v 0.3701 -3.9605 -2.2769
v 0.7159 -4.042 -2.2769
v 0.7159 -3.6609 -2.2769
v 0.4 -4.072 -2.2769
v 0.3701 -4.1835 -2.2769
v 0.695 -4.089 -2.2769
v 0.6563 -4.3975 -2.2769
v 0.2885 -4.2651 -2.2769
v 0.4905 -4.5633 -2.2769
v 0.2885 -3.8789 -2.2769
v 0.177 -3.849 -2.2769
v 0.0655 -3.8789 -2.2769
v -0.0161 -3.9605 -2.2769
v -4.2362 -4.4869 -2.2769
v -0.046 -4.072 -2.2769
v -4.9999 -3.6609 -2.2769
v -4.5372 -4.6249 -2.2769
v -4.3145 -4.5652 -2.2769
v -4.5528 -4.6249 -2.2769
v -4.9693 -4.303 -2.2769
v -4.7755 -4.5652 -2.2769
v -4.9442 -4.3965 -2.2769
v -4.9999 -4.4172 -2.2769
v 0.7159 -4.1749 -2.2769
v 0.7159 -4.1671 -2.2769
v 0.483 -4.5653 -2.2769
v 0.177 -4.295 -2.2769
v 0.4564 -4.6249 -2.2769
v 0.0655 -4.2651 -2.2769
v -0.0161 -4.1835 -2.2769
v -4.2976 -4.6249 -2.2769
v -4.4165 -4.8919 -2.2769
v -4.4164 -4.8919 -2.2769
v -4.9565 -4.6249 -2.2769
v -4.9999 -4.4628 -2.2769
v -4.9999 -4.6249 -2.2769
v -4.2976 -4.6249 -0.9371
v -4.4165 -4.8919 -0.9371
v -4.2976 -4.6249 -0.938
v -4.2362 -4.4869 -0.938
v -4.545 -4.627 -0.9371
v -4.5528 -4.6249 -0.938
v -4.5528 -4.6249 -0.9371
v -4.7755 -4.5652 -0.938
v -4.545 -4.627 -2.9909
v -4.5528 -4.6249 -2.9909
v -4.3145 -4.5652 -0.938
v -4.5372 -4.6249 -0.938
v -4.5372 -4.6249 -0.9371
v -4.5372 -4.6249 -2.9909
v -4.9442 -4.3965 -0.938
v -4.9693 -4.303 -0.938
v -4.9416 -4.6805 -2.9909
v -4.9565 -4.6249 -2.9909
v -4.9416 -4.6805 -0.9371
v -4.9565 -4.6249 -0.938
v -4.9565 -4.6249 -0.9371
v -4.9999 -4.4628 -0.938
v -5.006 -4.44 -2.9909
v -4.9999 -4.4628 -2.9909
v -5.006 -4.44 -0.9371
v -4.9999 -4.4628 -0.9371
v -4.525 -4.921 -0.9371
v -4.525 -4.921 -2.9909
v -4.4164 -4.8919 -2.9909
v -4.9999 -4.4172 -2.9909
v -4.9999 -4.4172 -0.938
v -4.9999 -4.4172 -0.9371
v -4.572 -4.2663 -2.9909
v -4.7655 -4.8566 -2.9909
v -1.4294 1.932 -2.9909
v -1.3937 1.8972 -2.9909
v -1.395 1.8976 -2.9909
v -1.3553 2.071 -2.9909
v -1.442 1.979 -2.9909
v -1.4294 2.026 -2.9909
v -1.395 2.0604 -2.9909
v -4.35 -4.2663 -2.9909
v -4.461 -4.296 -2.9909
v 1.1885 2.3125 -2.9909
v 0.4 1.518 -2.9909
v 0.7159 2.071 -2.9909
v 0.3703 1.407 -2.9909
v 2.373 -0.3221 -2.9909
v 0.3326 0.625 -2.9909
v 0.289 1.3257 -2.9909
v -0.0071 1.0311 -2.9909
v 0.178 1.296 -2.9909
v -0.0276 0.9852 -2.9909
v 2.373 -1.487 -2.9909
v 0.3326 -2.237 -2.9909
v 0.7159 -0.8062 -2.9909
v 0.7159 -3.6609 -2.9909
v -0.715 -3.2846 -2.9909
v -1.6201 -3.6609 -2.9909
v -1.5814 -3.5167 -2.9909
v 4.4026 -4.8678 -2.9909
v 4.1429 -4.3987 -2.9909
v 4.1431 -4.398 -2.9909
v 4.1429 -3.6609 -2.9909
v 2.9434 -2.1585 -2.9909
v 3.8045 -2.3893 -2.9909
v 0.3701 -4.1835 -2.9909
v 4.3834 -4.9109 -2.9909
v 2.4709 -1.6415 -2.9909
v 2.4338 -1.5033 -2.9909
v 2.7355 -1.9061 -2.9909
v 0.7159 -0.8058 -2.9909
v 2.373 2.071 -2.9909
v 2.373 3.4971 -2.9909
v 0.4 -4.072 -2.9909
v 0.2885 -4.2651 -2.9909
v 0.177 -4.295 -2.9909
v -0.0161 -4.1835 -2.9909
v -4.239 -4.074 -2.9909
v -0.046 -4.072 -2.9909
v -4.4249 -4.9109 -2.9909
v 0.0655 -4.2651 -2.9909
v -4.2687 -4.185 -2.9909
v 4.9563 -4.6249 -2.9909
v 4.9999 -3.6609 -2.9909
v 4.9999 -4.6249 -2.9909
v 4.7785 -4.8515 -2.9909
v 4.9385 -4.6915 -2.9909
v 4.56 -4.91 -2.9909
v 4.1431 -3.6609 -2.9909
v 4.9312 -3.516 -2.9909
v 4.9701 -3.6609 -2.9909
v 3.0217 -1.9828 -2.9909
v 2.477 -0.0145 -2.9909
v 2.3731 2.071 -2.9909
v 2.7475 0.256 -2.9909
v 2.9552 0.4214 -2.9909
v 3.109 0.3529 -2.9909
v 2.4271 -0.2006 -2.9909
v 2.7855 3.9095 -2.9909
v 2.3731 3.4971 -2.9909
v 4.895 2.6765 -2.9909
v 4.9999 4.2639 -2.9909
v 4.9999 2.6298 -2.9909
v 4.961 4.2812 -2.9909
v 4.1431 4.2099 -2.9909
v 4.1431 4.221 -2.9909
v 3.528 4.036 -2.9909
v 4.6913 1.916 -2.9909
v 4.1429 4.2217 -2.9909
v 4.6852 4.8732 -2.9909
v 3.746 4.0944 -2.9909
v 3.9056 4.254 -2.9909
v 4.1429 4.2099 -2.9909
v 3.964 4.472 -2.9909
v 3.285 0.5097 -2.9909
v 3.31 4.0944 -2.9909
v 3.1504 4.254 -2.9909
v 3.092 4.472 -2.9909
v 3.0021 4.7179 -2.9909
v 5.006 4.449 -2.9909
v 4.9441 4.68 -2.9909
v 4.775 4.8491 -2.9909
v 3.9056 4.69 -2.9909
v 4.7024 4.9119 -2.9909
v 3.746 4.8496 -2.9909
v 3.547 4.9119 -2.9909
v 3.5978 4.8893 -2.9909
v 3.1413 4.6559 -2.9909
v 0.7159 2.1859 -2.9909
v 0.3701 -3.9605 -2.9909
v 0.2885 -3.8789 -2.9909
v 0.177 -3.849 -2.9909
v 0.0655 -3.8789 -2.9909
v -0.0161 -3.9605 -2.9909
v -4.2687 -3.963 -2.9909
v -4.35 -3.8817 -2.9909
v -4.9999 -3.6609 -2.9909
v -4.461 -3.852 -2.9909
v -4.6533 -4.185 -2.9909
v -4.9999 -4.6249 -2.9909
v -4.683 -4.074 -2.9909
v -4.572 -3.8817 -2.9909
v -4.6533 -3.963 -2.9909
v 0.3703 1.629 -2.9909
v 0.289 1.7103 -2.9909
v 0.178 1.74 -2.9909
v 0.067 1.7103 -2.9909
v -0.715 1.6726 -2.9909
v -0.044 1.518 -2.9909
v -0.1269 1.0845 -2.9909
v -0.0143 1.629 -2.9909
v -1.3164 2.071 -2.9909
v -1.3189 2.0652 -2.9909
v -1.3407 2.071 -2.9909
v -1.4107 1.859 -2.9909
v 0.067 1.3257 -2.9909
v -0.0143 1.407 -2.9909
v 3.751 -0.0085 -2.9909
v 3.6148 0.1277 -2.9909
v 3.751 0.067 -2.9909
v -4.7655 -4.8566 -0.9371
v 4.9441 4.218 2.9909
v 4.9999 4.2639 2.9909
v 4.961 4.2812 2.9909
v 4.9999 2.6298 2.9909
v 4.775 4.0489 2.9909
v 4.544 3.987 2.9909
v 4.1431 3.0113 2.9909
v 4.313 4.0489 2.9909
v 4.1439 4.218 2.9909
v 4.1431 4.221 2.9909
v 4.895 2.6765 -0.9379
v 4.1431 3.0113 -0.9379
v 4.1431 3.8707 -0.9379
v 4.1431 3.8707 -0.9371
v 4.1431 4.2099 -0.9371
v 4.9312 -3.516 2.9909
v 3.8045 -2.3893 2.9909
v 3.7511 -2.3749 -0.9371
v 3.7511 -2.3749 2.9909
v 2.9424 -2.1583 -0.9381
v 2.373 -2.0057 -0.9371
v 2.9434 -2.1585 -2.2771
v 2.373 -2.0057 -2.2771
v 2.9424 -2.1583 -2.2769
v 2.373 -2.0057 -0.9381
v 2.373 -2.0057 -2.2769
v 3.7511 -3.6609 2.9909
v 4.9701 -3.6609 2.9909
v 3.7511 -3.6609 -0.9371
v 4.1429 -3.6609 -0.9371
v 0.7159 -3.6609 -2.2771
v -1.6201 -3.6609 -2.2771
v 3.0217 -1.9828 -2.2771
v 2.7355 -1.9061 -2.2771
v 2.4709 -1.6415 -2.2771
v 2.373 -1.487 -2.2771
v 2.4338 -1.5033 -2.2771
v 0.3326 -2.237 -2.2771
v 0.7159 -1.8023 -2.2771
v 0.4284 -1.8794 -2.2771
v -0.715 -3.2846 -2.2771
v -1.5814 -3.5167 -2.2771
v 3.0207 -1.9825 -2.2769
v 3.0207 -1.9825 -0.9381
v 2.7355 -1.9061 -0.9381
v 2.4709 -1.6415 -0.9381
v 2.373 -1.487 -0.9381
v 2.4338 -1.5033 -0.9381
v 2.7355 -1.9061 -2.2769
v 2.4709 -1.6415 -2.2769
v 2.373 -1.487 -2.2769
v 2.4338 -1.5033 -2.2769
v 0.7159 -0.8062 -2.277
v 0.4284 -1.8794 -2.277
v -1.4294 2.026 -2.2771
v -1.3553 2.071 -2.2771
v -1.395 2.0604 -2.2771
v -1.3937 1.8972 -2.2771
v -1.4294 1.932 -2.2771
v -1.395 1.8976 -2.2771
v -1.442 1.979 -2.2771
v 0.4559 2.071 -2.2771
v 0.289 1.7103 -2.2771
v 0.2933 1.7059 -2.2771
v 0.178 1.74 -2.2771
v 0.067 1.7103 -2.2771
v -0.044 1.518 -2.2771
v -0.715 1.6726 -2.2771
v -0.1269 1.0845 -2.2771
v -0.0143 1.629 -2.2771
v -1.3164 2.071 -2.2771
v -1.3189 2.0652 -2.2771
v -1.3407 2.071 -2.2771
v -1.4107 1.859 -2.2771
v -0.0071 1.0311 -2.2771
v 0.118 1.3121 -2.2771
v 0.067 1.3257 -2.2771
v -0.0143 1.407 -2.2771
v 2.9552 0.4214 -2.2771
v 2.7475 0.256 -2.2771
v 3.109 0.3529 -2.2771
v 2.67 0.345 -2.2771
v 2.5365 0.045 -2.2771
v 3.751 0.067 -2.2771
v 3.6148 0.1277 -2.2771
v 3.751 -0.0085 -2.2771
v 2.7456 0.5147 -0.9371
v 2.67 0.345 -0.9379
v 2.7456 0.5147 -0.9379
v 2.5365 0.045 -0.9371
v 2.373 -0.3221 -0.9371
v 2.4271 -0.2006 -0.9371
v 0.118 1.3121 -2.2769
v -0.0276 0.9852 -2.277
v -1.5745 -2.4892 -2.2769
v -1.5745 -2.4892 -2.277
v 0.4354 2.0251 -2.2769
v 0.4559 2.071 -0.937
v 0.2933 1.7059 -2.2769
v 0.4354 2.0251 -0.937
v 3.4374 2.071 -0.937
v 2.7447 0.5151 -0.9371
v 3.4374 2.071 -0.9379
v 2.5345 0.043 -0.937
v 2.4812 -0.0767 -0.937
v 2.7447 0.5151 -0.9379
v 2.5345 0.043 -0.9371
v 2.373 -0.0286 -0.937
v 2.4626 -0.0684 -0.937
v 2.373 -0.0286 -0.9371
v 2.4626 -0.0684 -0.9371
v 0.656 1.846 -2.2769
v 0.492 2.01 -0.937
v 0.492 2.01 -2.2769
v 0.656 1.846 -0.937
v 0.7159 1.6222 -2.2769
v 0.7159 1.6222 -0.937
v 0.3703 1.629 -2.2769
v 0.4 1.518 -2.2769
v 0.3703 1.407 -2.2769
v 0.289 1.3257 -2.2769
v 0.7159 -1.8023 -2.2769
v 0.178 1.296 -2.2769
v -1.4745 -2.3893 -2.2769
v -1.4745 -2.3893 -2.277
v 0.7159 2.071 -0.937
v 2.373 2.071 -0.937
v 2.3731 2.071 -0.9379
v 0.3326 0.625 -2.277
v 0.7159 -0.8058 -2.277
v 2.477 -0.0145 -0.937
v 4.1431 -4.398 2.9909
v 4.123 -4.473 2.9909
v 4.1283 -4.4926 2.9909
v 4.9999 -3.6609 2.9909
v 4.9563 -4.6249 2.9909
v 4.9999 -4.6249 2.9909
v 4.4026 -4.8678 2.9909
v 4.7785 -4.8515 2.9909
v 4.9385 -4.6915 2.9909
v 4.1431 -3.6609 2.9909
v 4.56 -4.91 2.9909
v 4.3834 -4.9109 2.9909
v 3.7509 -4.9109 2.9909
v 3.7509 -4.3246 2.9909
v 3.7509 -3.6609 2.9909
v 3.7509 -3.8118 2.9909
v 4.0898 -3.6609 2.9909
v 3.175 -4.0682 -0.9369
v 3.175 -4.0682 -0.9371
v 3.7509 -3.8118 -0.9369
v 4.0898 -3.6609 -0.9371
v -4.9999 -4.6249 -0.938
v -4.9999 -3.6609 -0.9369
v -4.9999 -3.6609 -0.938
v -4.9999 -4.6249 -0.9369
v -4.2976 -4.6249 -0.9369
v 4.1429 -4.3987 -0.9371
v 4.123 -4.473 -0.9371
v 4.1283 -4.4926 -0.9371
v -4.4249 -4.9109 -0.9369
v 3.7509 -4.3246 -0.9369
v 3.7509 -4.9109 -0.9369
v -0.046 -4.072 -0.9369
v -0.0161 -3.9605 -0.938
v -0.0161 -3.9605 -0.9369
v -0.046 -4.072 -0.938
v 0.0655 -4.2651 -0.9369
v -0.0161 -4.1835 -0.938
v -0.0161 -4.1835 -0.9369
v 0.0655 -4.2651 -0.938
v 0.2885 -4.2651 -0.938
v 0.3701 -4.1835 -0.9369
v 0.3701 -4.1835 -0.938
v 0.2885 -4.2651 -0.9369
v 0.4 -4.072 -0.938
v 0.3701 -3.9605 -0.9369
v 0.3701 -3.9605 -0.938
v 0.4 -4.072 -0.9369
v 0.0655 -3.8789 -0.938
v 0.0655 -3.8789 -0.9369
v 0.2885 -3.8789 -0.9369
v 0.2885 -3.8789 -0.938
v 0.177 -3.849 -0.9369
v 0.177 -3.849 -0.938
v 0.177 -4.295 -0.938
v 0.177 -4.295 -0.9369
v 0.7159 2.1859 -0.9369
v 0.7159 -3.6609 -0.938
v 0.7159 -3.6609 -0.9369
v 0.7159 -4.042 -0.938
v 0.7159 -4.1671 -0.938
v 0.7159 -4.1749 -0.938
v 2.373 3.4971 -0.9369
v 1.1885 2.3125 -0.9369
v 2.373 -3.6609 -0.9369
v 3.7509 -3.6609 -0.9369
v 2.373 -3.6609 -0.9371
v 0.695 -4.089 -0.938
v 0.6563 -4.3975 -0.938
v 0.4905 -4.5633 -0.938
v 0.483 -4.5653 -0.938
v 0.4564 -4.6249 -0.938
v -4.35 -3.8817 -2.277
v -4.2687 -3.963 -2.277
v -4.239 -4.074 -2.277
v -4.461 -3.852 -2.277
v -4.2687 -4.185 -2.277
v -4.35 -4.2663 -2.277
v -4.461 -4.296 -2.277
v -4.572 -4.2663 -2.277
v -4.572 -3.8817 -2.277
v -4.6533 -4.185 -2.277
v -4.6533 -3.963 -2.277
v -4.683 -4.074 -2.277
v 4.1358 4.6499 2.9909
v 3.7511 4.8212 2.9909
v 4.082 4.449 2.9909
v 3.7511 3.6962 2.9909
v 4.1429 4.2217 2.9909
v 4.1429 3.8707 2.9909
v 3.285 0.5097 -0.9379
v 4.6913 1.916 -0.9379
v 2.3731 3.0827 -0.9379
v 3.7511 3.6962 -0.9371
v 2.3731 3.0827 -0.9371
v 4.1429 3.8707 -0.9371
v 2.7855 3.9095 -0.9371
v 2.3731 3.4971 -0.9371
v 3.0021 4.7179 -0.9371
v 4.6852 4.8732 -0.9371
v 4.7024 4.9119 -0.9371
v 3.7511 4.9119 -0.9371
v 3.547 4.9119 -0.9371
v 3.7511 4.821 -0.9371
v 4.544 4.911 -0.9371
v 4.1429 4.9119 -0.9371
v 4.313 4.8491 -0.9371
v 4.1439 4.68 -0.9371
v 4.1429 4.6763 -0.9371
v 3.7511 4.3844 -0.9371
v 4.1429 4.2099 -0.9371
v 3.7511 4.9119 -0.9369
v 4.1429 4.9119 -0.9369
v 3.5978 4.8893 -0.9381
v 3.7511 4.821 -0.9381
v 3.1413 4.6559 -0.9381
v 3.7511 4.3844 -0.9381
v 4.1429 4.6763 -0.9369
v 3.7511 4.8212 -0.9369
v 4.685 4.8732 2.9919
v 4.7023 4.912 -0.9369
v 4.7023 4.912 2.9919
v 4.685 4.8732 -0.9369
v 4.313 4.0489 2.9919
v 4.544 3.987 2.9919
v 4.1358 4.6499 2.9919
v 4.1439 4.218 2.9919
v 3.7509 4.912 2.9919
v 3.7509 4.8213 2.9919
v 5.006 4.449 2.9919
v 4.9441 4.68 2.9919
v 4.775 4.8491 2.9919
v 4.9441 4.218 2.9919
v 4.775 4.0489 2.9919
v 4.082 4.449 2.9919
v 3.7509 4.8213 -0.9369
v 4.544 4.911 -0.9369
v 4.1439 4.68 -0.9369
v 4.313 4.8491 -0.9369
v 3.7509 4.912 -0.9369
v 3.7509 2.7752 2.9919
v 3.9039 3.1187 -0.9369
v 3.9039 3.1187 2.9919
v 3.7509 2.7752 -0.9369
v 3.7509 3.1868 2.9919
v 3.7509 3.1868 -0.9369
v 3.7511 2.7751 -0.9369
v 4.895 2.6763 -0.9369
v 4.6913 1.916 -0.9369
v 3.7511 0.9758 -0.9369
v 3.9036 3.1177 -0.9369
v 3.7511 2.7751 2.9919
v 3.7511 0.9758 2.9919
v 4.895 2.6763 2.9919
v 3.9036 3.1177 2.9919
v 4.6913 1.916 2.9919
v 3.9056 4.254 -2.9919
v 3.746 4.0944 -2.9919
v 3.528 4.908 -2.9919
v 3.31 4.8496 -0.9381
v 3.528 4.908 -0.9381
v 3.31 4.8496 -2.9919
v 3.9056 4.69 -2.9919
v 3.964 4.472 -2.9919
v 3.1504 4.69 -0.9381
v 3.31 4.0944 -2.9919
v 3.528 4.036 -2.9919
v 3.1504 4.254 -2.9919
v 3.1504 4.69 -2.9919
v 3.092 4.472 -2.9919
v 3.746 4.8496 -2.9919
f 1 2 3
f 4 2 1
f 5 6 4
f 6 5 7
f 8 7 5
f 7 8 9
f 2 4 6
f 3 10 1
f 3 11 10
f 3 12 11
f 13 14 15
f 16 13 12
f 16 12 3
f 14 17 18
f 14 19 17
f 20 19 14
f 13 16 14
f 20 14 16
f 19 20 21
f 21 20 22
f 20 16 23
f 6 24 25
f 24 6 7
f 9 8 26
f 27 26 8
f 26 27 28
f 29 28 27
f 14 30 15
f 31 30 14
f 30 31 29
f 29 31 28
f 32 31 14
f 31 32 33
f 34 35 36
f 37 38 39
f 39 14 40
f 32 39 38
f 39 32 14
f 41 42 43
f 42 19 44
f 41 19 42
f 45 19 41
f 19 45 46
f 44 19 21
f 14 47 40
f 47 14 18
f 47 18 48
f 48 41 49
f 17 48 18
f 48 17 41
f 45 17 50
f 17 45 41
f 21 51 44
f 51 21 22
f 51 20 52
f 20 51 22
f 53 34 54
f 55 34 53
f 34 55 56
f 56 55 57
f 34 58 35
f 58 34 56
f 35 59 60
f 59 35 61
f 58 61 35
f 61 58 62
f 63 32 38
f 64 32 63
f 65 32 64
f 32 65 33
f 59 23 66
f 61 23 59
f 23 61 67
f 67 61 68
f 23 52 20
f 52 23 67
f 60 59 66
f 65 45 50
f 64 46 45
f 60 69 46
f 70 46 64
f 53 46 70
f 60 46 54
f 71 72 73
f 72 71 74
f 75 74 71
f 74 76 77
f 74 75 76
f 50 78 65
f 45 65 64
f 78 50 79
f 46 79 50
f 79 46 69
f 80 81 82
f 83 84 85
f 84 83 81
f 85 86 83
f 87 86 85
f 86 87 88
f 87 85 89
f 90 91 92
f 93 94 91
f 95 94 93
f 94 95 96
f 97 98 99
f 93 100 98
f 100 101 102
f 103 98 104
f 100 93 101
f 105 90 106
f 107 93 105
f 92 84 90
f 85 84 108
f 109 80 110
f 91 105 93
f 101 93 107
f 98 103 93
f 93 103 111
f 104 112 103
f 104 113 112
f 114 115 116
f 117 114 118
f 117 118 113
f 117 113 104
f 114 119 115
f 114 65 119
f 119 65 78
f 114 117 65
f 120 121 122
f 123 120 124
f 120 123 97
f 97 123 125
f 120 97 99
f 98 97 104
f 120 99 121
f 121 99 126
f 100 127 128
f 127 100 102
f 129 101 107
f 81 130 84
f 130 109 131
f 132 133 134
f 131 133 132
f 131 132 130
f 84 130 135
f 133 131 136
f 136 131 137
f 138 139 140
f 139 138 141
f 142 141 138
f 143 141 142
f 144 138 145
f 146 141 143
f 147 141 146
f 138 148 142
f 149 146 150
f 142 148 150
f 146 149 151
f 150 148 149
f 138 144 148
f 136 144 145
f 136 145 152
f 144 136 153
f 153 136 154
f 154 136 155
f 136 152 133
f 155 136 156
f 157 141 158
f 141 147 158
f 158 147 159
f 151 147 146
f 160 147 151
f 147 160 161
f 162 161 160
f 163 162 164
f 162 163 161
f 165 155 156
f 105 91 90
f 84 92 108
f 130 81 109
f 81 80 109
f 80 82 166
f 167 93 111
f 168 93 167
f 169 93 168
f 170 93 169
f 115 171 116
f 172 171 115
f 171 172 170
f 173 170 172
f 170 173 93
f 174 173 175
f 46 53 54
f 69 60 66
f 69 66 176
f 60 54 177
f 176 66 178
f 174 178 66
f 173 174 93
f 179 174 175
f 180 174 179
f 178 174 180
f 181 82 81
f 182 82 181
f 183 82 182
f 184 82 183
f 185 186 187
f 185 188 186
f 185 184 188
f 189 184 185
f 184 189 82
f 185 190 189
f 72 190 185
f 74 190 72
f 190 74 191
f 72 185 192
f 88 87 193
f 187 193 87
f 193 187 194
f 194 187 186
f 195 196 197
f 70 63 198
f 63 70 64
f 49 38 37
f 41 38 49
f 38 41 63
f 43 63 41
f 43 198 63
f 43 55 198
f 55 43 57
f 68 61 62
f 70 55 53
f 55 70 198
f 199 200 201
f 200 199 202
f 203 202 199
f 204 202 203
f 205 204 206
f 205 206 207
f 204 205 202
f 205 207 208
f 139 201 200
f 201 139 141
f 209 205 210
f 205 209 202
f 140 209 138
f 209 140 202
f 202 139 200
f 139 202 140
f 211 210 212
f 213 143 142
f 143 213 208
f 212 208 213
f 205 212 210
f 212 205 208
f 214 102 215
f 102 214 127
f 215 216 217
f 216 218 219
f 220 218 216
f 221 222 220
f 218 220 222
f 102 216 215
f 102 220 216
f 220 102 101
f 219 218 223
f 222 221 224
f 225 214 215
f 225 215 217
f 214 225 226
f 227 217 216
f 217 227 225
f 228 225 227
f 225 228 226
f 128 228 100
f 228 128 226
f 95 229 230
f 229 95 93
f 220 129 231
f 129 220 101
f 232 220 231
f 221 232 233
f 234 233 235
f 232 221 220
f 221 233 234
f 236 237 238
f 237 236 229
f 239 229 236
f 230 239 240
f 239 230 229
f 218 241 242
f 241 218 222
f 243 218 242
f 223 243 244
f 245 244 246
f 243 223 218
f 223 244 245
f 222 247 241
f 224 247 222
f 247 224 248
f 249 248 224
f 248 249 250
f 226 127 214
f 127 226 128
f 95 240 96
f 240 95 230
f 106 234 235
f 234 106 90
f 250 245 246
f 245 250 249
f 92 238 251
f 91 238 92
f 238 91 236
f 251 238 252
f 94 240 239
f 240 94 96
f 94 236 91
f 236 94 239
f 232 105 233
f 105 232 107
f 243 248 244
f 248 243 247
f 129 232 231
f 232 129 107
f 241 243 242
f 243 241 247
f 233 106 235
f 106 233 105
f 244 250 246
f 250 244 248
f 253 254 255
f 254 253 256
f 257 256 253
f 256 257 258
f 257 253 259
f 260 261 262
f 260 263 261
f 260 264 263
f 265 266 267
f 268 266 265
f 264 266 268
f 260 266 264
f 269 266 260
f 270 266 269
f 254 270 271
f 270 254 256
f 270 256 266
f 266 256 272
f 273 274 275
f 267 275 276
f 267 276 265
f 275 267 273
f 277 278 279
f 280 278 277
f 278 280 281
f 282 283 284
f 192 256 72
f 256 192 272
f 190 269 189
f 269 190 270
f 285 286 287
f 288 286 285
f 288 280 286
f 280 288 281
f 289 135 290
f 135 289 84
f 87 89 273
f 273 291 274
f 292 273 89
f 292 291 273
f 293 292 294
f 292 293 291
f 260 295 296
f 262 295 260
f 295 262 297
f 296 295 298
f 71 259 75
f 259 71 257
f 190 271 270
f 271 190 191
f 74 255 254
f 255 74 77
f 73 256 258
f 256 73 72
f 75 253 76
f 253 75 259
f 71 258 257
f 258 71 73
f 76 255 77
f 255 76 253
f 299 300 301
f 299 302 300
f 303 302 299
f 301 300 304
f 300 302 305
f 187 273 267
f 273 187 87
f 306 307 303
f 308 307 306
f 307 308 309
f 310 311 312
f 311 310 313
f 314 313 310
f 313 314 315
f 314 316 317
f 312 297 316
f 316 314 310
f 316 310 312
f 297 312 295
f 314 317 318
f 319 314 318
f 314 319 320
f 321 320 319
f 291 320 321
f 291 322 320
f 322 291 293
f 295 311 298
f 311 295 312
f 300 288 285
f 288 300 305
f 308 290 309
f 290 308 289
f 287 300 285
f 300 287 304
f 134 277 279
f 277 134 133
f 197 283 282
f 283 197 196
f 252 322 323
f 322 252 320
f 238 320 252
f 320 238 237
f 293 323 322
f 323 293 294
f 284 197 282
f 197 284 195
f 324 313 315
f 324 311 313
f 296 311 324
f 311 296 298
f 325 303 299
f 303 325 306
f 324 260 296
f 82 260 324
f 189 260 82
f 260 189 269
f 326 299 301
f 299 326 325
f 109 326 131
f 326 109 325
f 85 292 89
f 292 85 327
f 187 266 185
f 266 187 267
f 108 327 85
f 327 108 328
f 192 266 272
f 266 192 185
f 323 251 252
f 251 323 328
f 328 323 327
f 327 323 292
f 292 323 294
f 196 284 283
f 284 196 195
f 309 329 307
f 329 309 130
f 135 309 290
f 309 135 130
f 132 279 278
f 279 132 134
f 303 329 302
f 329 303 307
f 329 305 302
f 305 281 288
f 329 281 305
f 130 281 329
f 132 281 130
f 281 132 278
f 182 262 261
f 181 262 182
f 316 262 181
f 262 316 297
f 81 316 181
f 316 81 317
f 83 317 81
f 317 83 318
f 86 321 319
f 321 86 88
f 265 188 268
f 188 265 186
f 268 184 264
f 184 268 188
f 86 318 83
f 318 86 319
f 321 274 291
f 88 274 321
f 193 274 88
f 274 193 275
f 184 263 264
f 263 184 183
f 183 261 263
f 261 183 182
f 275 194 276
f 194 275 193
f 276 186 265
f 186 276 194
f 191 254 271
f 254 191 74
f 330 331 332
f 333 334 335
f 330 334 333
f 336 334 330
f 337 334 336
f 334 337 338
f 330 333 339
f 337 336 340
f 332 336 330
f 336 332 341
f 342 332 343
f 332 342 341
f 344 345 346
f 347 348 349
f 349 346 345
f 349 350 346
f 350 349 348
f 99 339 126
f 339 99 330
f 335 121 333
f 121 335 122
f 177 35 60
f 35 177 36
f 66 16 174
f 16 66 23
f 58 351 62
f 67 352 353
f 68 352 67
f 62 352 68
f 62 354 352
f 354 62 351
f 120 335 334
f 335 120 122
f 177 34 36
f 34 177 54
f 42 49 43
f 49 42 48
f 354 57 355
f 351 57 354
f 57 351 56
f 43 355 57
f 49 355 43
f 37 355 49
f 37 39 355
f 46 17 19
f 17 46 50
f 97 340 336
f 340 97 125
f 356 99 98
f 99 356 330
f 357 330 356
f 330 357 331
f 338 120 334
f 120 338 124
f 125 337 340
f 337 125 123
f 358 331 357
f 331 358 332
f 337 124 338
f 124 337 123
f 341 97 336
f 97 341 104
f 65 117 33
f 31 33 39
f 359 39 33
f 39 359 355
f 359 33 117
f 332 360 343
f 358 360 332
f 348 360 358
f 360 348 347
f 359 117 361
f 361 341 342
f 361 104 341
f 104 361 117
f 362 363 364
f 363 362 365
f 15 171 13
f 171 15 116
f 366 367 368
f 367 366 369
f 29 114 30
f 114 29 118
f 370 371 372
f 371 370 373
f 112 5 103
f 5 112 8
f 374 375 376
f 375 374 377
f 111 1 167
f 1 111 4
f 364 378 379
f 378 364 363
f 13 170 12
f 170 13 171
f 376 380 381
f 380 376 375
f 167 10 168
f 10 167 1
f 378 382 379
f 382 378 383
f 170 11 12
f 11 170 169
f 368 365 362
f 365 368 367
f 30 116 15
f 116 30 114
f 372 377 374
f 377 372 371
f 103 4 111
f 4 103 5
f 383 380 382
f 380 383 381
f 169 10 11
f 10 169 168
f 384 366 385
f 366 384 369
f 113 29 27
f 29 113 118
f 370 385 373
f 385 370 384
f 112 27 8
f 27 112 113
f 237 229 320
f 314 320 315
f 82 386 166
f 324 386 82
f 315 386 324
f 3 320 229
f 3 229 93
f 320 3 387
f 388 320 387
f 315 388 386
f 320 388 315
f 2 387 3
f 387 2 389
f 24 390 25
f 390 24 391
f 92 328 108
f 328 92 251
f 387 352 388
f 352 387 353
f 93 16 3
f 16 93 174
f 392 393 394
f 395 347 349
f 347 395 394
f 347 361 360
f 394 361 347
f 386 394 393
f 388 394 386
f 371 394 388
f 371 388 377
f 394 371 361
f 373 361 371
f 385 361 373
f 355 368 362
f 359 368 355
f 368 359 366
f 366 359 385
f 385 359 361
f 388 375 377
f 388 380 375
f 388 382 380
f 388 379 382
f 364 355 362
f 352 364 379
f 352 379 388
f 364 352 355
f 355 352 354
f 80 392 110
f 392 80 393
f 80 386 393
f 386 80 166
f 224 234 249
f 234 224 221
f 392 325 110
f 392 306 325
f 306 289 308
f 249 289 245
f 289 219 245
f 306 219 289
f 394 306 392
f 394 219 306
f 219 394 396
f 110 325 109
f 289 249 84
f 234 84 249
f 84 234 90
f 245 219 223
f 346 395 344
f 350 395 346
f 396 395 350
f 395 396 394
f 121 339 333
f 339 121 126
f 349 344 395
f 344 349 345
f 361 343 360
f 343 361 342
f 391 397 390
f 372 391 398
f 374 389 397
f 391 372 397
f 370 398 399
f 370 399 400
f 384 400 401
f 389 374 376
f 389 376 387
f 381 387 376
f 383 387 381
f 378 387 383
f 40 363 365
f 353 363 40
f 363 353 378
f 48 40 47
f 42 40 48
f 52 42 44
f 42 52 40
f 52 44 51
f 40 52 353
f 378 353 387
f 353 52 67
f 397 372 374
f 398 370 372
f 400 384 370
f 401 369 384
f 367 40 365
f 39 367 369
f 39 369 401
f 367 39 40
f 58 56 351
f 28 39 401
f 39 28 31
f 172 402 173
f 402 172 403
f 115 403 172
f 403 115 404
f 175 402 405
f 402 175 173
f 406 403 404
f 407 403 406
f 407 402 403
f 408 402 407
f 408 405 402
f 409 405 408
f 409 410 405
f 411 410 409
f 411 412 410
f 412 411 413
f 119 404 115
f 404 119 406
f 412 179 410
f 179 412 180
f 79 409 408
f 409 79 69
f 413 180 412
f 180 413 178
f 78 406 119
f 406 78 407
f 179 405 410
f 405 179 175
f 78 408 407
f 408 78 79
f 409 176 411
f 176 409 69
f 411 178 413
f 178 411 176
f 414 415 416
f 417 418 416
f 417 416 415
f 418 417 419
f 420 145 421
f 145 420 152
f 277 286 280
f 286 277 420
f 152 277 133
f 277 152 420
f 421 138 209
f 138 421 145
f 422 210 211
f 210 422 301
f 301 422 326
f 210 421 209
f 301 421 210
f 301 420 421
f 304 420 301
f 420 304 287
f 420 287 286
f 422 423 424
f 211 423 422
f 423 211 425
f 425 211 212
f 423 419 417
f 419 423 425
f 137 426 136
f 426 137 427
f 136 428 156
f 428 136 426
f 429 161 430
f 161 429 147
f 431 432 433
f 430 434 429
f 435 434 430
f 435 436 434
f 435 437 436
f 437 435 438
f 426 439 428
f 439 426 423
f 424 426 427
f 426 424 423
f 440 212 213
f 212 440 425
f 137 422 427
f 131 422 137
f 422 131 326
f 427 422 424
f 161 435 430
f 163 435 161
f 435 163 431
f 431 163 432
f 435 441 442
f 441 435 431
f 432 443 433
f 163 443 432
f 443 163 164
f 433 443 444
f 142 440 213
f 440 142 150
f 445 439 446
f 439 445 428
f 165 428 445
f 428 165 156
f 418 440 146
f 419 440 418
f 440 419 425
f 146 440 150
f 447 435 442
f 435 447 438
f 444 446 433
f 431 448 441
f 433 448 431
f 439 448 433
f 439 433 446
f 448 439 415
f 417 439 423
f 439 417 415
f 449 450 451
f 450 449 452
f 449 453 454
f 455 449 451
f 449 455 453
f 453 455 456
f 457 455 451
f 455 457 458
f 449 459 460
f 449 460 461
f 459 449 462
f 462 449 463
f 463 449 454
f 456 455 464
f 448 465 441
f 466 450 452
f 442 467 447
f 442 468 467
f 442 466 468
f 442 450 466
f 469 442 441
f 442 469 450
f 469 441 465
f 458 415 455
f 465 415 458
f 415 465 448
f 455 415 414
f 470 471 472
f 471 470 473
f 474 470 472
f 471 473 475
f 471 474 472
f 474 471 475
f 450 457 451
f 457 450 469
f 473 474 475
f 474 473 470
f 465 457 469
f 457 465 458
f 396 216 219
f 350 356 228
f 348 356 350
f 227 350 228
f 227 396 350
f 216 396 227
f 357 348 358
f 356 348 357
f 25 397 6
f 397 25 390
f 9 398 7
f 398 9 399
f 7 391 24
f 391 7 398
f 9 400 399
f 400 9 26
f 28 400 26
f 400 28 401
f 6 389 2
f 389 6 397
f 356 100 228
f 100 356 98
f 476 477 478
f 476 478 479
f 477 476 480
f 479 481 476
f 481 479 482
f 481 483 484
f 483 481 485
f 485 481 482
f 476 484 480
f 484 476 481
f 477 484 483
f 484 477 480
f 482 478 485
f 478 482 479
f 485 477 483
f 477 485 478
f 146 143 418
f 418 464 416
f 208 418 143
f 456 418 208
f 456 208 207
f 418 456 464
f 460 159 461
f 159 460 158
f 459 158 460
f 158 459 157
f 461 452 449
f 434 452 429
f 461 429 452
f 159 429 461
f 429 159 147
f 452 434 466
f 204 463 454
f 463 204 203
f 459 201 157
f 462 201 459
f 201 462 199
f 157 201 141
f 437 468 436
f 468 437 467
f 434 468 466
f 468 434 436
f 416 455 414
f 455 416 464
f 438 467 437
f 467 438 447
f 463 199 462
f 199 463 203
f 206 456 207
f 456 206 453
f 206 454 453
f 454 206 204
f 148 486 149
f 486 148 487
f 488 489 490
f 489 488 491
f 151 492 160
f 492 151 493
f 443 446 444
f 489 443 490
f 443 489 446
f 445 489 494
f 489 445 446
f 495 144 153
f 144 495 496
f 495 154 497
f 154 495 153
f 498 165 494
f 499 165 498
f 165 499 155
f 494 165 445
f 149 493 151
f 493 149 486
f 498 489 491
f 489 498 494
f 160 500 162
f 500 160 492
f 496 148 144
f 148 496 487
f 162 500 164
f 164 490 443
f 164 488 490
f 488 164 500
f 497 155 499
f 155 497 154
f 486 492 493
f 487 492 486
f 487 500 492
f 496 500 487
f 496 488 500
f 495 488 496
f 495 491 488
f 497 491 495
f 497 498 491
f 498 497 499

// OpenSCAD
intersection() {
  translate([0, 0, 0.0005])
  cube(size = [11.9998, 11.7858, 7.1788], center = true);

  union() {
    difference() {
      translate([-4.525, -4.44, -1.964])
      cylinder(h = 2.0538, r1 = 0.481, r2 = 0.481, center = true, $fn = 12);
    
      union() {
        translate([-3.47893, -9.68479, 0.357])
        rotate([0, 0, -24])
        cube(size = [5.6119, 15.6749, 5.2679], center = true);
      
        translate([-4.545, -4.166, -7.5545])
        rotate([180, 0, 180])
        cylinder(h = 21.0909, r1 = 0.461, r2 = 0.461, center = true, $fn = 12);
      }
    }
  
    intersection() {
      translate([9.4414, 1.46937, 0])
      rotate([0, 0, -24])
      cube(size = [20.1448, 1.4928, 5.9818], center = true);
    
      translate([4.5715, 10.0855, 0])
      cube(size = [0.8568, 16.0288, 5.9818], center = true);
    }
  
    intersection() {
      union() {
        translate([0.695208, -0.309527, -2.634])
        rotate([0, 0, -24])
        cube(size = [5.6118, 36.1998, 0.7138], center = true);
      
        intersection() {
          translate([1.165, -6.961, 7.5545])
          cylinder(h = 21.0908, r1 = 5.279, r2 = 5.279, center = true, $fn = 12);
        
          translate([4.3755, 7.2195, 0])
          cube(size = [1.2488, 21.7608, 5.9818], center = true);
        }
      
        translate([2.67852, -1.19255, -1.6075])
        rotate([0, 0, -24])
        cube(size = [1.2678, 36.1998, 1.3388], center = true);
      }
    
      difference() {
        intersection() {
          translate([1.675, -4.937, -7.5545])
          cylinder(h = 21.0908, r1 = 3.637, r2 = 3.637, center = true, $fn = 12);
        
          translate([0, 7.2195, 7.5545])
          cube(size = [9.9998, 21.7608, 21.0908], center = true);
        }
      
        union() {
          translate([-2.146, -0.806, -10.1885])
          cylinder(h = 15.8229, r1 = 2.862, r2 = 2.862, center = true, $fn = 12);
        
          translate([3.097, -1.28, -7.5545])
          rotate([180, 0, 180])
          cylinder(h = 21.0909, r1 = 0.723, r2 = 0.723, center = true, $fn = 12);
        }
      }
    }
  
    difference() {
      intersection() {
        union() {
          translate([8.42679, -0.809468, -2.634])
          rotate([0, 0, -24])
          cube(size = [20.1448, 3.4978, 0.7138], center = true);
        
          translate([-1.92309, -6.62179, 0])
          rotate([0, 0, -24])
          cube(size = [2.7248, 22.5368, 5.9818], center = true);
        
          translate([-1.348, 1.979, -10.1885])
          cylinder(h = 15.8228, r1 = 0.094, r2 = 0.094, center = true, $fn = 12);
        }
      
        union() {
          difference() {
            translate([-5.82099, 6.3512, 7.5545])
            rotate([0, 0, -24])
            cube(size = [20.3978, 4.9908, 21.0908], center = true);
          
            translate([0.268, 1.622, 7.9115])
            cylinder(h = 20.3769, r1 = 0.448, r2 = 0.448, center = true, $fn = 12);
          }
        
          difference() {
            translate([4.71478, -11.137, -1.964])
            rotate([0, 0, -24])
            cube(size = [18.5258, 19.6868, 2.0538], center = true);
          
            translate([1.165, -6.961, 0])
            cylinder(h = 36.1999, r1 = 5.279, r2 = 5.279, center = true, $fn = 12);
          }
        }
      }
    
      union() {
        translate([-2.146, -0.806, -2.634])
        cylinder(h = 0.7139, r1 = 2.862, r2 = 2.862, center = true, $fn = 12);
      
        translate([3.117, -0.384, -1.964])
        cylinder(h = 2.0539, r1 = 0.739, r2 = 0.739, center = true, $fn = 12);
      
        difference() {
          translate([8.42679, -0.809468, 0])
          rotate([0, 0, -24])
          cube(size = [20.1449, 3.4979, 5.9819], center = true);
        
          translate([-7.1745, -8.0145, -1.964])
          cube(size = [21.851, 20.171, 2.054], center = true);
        }
      
        translate([0.178, 1.518, 7.5545])
        cylinder(h = 21.0909, r1 = 0.222, r2 = 0.222, center = true, $fn = 12);
      
        translate([-7.8635, 3.4915, -2.634])
        cube(size = [20.4729, 2.8409, 0.7139], center = true);
      
        translate([-7.8635, -8.239, 0.357])
        cube(size = [20.4729, 19.7219, 5.2679], center = true);
      }
    }
  
    translate([4.544, 4.449, 1.0275])
    cylinder(h = 3.9288, r1 = 0.462, r2 = 0.462, center = true, $fn = 12);
  
    difference() {
      union() {
        intersection() {
          union() {
            translate([-2.6625, 5.98007, 8.88178e-16])
            rotate([-180, 0, 24])
            cube(size = [36.1998, 23.1078, 5.9818], center = true);
          
            translate([11.1215, 0, 0])
            cube(size = [13.9568, 36.1998, 5.9818], center = true);
          }
        
          translate([0, 6.7375, -7.5545])
          cube(size = [9.9998, 22.7248, 21.0908], center = true);
        }
      
        intersection() {
          union() {
            translate([4.56, -4.473, -4.44089e-16])
            rotate([180, 0, 180])
            cylinder(h = 5.9818, r1 = 0.437, r2 = 0.437, center = true, $fn = 12);
          
            translate([-2.36669, -10.18, 0])
            rotate([0, 0, -24])
            cube(size = [8.0468, 15.6748, 5.9818], center = true);
          }
        
          union() {
            translate([-6.55, -4.286, 0])
            cube(size = [23.0998, 1.2498, 5.9818], center = true);
          
            translate([-9.70063, -6.91471, -10.5455])
            rotate([0, 0, -24])
            cube(size = [24.1008, 15.6748, 15.1088], center = true);
          }
        }
      }
    
      union() {
        translate([0.177, -4.072, 0])
        rotate([180, 0, 180])
        cylinder(h = 36.1999, r1 = 0.223, r2 = 0.223, center = true, $fn = 12);
      
        translate([-8.692, 7.2195, -7.5545])
        cube(size = [18.8159, 21.7609, 21.0909], center = true);
      
        translate([0.695208, -0.309527, 1.0275])
        rotate([0, 0, -24])
        cube(size = [5.6119, 36.1999, 3.9289], center = true);
      
        translate([-0.993, 6.091, -7.5545])
        cylinder(h = 21.0909, r1 = 4.363, r2 = 4.363, center = true, $fn = 12);
      
        translate([3.6865, 7.2195, 0])
        cube(size = [2.6269, 21.7609, 5.9819], center = true);
      
        translate([-7.1745, 6.5945, 1.0275])
        cube(size = [21.8509, 23.0109, 3.9289], center = true);
      
        translate([-2.142, 6.7375, -1.6075])
        cube(size = [5.7159, 22.7249, 1.3389], center = true);
      
        translate([-4.461, -4.074, -2.634])
        cylinder(h = 0.7139, r1 = 0.222, r2 = 0.222, center = true, $fn = 12);
      }
    }
  
    intersection() {
      difference() {
        difference() {
          translate([1.364, 3.837, -7.5545])
          cylinder(h = 21.0908, r1 = 3.842, r2 = 3.842, center = true, $fn = 12);
        
          translate([3.30453, -7.4221, 8.581])
          rotate([-180, 0, 24])
          cube(size = [36.1999, 19.9509, 19.0379], center = true);
        }
      
        union() {
          translate([-0.993, 6.091, -9.5185])
          cylinder(h = 17.1629, r1 = 4.363, r2 = 4.363, center = true, $fn = 12);
        
          translate([14.123, 6.64569, -1.964])
          rotate([0, 0, -24])
          cube(size = [15.8019, 12.5689, 2.0539], center = true);
        }
      }
    
      union() {
        translate([3.947, -6.594, 0])
        cube(size = [0.3918, 23.0118, 5.9818], center = true);
      
        difference() {
          translate([3.6865, -6.594, -1.964])
          cube(size = [2.6268, 23.0118, 2.0538], center = true);
        
          translate([10.4038, 1.64074, -9.5185])
          rotate([0, 0, -24])
          cube(size = [18.5259, 0.3989, 17.1629], center = true);
        }
      }
    }
  
    difference() {
      difference() {
        union() {
          translate([-2.33098, 14.1899, 1.0275])
          rotate([0, 0, -24])
          cube(size = [20.3978, 12.1698, 3.9288], center = true);
        
          translate([-9.99654, -3.02726, 1.0275])
          rotate([0, 0, -24])
          cube(size = [20.3978, 22.5368, 3.9288], center = true);
        }
      
        translate([0, 11.506, 0])
        cube(size = [36.1999, 13.1879, 36.1999], center = true);
      }
    
      translate([-7.1745, 0, 8.582])
      cube(size = [21.8509, 36.1999, 19.0379], center = true);
    }
  
    translate([3.528, 4.472, -1.965])
    rotate([180, 0, 180])
    cylinder(h = 2.0538, r1 = 0.436, r2 = 0.436, center = true, $fn = 12);
  
    intersection() {
      translate([3.79076, -1.68775, -1.964])
      rotate([0, 0, -24])
      cube(size = [3.7028, 36.1998, 2.0538], center = true);
    
      translate([-6.9785, 6.5945, -9.5185])
      cube(size = [22.2428, 23.0108, 17.1628], center = true);
    
      difference() {
        translate([1.165, -6.961, -1.964])
        cylinder(h = 2.0538, r1 = 5.279, r2 = 5.279, center = true, $fn = 12);
      
        translate([0.264, -4.171, 7.9115])
        cylinder(h = 20.3769, r1 = 0.453, r2 = 0.453, center = true, $fn = 12);
      }
    }
  
    intersection() {
      translate([10.5421, -1.39716, 1.0275])
      rotate([0, 0, -24])
      cube(size = [15.8018, 2.8488, 3.9288], center = true);
    
      union() {
        translate([4.3755, -6.594, 8.582])
        cube(size = [1.2488, 23.0118, 19.0378], center = true);
      
        translate([-4.61869, -7.33615, -2.634])
        rotate([0, 0, -24])
        cube(size = [1.6188, 19.0388, 0.7138], center = true);
      }
    
      translate([1.364, 3.837, 7.5545])
      cylinder(h = 21.0908, r1 = 3.842, r2 = 3.842, center = true, $fn = 12);
    }
  
    translate([4.544, 4.449, 0])
    cylinder(h = 5.9818, r1 = 0.462, r2 = 0.462, center = true, $fn = 12);
  }
}
